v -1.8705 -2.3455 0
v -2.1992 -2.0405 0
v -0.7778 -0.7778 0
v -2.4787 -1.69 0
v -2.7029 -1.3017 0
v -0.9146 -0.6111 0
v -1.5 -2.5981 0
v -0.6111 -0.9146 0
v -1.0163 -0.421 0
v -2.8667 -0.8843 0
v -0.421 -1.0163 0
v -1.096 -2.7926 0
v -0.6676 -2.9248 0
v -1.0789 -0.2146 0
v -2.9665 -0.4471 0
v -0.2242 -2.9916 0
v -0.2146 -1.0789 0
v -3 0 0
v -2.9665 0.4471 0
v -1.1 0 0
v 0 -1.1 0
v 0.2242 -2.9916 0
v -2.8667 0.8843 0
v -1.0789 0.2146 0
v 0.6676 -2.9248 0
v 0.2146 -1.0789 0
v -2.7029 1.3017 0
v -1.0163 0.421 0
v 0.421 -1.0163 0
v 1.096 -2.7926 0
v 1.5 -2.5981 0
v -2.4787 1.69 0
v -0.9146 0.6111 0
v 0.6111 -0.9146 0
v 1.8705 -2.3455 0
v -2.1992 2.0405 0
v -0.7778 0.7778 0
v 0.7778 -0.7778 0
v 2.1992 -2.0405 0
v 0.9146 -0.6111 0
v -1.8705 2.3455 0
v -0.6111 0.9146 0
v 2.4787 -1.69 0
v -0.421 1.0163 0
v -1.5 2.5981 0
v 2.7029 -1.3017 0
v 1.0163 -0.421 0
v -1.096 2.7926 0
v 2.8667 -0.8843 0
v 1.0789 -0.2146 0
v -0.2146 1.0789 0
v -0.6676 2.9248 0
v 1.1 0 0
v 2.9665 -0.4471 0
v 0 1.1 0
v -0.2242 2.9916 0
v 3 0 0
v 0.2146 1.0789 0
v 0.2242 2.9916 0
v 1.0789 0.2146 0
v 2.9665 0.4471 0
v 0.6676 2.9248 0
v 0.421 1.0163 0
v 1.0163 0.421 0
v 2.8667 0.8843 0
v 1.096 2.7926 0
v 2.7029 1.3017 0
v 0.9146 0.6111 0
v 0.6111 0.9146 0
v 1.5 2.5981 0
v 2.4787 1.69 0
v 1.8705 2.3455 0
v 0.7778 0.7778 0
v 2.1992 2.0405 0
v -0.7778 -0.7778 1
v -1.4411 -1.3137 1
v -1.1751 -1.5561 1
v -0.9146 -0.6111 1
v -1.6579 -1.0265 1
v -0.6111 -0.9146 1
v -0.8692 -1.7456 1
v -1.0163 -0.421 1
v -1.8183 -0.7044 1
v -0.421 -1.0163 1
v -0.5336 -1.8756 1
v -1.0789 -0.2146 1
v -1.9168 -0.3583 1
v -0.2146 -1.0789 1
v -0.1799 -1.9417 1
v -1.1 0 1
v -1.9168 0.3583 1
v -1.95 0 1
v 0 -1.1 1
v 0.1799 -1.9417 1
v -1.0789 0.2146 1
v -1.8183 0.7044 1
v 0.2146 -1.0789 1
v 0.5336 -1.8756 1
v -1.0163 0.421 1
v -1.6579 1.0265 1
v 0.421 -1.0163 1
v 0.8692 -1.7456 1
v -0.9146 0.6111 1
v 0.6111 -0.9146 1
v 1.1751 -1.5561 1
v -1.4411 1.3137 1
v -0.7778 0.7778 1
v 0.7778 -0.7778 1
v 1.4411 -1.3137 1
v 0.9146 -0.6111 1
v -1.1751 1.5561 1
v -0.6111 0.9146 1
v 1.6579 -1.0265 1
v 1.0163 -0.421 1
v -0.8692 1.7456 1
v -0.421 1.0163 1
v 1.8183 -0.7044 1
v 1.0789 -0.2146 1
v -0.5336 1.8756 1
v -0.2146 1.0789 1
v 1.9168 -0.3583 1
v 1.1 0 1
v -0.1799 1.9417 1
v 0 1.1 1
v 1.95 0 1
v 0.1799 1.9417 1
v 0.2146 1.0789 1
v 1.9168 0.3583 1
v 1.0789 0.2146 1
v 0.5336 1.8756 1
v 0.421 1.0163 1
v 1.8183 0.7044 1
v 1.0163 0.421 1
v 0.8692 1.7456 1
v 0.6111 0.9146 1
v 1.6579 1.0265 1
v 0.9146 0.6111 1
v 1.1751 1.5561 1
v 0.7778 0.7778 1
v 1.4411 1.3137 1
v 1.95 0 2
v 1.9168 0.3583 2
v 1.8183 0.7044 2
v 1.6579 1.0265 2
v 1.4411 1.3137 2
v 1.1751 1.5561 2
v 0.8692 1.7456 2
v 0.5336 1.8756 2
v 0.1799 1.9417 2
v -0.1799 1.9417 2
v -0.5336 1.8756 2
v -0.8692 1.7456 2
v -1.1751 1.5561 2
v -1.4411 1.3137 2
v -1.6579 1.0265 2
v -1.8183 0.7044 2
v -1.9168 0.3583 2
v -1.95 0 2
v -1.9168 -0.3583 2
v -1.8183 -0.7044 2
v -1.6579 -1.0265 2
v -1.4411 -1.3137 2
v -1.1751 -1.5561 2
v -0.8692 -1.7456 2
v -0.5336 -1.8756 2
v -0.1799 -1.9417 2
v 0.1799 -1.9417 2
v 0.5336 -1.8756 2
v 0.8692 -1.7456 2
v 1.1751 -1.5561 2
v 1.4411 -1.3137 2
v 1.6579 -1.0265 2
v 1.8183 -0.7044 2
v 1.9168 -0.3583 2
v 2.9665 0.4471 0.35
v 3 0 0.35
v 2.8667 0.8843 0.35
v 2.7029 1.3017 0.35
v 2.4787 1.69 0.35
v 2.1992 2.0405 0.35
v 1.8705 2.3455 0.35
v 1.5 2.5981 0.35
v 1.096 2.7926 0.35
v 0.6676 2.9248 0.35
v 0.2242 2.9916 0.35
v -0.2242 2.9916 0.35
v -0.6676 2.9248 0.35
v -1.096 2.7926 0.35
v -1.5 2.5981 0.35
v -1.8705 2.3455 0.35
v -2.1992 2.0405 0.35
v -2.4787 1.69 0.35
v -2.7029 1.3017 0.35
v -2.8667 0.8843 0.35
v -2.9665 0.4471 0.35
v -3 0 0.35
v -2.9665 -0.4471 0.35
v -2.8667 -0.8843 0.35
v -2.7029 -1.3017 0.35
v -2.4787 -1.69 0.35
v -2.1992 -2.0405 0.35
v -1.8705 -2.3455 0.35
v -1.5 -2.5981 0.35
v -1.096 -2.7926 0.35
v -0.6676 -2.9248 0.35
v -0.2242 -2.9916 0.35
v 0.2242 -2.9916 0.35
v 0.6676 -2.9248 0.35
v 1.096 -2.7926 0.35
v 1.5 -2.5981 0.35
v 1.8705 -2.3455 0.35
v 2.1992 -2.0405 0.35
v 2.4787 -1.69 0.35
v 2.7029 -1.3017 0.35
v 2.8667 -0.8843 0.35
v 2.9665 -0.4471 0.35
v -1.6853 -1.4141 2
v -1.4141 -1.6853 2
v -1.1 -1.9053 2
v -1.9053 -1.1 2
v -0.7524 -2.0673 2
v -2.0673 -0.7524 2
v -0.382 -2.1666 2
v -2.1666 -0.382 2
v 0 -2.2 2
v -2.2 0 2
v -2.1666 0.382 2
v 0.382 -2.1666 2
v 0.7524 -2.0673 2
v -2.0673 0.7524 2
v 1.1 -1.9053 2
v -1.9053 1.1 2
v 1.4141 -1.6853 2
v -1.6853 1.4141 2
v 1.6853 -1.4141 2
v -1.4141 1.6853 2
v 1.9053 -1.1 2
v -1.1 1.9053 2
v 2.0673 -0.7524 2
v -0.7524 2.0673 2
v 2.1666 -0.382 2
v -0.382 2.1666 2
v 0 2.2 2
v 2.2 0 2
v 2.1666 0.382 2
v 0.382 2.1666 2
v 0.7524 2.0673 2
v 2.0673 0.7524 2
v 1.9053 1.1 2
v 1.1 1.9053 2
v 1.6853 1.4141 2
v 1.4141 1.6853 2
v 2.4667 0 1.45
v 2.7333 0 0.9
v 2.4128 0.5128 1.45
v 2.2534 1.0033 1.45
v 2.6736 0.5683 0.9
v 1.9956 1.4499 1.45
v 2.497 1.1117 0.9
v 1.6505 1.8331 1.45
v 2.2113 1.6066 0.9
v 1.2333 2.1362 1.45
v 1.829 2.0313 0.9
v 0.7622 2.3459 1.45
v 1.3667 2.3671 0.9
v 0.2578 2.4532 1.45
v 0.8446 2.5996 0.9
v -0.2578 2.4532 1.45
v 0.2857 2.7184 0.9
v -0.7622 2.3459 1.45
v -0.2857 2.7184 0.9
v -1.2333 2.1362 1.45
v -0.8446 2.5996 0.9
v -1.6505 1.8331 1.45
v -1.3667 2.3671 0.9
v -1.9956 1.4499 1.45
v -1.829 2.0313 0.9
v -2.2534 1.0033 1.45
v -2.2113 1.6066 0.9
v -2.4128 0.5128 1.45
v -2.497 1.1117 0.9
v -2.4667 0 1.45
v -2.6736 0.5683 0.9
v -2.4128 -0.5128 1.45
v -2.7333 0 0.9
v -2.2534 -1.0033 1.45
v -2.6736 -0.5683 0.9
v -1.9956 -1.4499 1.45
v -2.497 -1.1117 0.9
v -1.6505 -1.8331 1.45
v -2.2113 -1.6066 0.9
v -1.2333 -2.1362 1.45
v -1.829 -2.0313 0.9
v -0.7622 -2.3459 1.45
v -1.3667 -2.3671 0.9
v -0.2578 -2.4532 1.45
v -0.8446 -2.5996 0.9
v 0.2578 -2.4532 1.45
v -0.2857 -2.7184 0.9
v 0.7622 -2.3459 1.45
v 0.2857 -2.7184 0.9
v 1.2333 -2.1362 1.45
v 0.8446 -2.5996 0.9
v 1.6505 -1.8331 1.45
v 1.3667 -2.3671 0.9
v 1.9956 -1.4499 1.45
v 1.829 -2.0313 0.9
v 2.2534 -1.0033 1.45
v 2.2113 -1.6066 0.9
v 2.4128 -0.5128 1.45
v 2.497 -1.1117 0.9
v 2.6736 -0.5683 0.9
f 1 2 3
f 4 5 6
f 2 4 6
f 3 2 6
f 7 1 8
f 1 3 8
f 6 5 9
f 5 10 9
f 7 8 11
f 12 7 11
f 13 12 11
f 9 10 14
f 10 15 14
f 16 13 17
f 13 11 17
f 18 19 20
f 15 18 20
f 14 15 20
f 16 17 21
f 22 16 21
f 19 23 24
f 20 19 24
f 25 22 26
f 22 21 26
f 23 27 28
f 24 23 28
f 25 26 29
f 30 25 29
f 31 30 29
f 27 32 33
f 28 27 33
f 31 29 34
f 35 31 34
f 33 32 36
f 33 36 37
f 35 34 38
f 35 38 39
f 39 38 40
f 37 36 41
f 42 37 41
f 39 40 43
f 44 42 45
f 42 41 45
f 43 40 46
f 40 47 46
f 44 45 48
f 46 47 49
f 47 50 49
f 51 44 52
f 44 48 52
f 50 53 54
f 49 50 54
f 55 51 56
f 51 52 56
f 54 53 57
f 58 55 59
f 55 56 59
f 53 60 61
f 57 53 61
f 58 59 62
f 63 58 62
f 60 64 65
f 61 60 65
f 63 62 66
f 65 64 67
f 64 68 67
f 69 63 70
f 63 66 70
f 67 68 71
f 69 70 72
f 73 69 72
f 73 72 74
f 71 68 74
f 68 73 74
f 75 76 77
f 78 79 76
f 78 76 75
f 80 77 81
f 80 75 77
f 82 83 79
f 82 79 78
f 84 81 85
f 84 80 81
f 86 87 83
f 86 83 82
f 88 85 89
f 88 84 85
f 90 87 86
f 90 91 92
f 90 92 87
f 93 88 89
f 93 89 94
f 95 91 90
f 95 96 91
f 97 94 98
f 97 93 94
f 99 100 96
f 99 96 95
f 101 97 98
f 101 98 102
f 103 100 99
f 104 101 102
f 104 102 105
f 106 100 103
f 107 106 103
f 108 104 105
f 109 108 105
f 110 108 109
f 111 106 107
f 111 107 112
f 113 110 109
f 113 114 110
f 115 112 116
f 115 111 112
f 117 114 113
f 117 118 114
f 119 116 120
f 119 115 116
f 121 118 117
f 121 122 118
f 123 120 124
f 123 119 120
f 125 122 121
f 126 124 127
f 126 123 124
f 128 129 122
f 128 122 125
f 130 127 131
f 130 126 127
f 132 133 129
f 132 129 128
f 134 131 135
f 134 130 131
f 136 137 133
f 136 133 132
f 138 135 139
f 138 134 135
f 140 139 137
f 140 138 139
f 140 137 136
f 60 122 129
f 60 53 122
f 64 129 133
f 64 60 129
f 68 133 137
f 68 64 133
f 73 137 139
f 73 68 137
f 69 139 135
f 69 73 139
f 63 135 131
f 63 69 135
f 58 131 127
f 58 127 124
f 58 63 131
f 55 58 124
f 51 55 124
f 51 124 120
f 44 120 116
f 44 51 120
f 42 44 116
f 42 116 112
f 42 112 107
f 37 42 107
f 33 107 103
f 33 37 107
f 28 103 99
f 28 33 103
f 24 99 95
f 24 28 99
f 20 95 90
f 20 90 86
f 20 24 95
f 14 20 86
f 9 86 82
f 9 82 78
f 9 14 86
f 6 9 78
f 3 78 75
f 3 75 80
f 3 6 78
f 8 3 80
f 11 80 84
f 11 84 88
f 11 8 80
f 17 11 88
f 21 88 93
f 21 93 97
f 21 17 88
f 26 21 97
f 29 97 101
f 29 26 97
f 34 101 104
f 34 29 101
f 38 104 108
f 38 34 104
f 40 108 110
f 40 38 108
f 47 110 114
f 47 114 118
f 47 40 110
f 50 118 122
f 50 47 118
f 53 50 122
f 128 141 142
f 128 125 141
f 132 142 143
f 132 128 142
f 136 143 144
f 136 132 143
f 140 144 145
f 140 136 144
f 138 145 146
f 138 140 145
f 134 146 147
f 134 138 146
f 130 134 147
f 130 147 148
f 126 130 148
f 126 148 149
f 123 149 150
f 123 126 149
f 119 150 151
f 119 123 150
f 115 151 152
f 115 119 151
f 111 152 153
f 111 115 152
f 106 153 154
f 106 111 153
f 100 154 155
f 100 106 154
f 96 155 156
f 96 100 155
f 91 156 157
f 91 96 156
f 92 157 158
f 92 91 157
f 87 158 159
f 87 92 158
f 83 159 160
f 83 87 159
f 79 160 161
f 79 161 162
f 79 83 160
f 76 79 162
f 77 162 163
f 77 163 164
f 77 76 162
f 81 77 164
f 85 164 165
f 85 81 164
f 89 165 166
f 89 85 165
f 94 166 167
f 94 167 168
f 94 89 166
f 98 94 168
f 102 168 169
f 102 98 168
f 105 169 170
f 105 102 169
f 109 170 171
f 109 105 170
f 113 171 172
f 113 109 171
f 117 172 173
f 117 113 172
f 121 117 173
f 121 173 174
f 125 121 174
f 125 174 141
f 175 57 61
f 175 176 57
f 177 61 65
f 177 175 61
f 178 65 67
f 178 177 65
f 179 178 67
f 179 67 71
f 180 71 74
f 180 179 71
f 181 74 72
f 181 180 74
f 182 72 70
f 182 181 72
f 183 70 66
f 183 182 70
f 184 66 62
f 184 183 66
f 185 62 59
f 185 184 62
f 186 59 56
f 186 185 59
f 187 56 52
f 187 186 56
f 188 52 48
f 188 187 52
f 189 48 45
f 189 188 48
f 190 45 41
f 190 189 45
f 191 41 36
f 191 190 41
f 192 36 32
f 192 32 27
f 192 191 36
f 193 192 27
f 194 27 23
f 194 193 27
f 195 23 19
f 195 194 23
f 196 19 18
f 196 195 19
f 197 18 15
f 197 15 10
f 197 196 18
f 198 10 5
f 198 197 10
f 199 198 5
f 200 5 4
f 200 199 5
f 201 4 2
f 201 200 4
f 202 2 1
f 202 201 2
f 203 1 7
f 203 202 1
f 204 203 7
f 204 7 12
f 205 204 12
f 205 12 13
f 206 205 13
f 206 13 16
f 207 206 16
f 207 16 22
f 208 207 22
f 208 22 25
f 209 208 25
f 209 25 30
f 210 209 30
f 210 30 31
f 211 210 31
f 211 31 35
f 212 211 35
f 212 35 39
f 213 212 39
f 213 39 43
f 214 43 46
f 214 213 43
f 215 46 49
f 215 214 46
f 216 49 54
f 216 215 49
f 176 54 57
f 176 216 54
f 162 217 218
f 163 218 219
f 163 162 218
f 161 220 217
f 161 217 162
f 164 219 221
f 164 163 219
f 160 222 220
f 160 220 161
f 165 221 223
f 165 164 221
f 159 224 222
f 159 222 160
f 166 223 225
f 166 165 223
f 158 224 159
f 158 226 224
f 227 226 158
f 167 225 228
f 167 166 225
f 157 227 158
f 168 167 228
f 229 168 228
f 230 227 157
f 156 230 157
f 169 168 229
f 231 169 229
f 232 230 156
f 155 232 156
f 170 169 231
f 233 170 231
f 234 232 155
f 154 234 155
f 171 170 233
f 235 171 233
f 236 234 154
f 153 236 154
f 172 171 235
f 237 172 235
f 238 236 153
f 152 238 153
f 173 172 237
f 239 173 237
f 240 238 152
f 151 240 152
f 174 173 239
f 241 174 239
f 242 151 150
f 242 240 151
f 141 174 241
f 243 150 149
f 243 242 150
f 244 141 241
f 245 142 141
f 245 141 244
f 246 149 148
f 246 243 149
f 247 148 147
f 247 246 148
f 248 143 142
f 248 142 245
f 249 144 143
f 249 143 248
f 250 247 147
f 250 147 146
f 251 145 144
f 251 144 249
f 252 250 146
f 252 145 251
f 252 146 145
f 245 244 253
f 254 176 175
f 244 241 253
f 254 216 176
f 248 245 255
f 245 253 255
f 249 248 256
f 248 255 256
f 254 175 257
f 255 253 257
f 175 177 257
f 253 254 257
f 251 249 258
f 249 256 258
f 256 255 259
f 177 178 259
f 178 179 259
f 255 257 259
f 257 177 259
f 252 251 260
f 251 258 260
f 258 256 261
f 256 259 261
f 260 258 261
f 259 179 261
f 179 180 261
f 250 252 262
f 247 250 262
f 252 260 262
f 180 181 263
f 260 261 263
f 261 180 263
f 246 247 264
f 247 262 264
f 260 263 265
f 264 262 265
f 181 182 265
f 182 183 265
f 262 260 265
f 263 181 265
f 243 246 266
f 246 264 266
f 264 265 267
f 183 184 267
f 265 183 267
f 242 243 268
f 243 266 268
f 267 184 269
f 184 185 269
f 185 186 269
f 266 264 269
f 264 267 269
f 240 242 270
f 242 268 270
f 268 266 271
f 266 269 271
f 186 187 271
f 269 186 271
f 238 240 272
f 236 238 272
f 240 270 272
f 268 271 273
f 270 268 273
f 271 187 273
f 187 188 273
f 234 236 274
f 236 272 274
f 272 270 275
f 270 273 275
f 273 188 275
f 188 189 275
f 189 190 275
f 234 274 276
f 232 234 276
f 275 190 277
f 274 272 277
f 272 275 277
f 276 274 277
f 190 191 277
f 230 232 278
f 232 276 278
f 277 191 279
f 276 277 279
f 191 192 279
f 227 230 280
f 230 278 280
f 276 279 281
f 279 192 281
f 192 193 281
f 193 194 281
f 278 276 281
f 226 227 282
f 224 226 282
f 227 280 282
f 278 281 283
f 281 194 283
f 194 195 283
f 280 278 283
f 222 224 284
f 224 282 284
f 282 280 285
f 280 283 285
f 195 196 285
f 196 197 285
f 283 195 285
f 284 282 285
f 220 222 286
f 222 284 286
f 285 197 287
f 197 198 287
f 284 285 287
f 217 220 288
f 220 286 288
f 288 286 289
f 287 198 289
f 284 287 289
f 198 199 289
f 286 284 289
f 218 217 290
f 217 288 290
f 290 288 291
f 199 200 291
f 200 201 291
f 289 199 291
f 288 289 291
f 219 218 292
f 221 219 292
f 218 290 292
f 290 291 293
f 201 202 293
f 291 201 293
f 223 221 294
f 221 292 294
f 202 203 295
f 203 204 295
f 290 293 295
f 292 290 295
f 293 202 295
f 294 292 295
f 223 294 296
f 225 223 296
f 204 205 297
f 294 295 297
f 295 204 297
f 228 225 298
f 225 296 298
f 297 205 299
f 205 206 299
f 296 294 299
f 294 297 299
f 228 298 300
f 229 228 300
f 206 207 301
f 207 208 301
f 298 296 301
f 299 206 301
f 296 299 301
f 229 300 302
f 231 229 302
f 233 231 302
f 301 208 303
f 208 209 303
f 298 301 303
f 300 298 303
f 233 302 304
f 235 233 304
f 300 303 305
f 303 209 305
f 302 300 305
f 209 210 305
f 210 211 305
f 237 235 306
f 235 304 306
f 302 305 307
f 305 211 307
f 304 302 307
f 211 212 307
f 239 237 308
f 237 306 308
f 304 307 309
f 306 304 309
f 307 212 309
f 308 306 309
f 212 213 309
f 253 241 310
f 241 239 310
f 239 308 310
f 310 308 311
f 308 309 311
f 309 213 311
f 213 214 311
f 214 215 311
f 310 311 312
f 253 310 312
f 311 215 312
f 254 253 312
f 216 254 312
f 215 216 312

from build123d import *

# Parameters (mm, degrees)
F7_R  = 3
F8_R  = 3
F10_R = 2.2
F9_R  = 1.95
F11_R = 1.95
F13_R = 1.1
F12_R = 1.1


with BuildPart() as f14:
    # F7 (on Top) → F14 section 0
    with BuildSketch(Plane.XY):
        Circle(F7_R)
    # F8 (on offset) → F14 section 1
    with BuildSketch(Plane.XY.offset(0.35)):
        Circle(F8_R)
    loft()

    # F10 (on offset) → F15 section 0
    with BuildSketch(Plane.XY.offset(2)):
        Circle(F10_R)
    # F8 (on offset) → F15 section 1
    with BuildSketch(Plane.XY.offset(0.35)):
        Circle(F8_R)
    loft()

    # F9 (on offset) → F16 section 0
    with BuildSketch(Plane.XY.offset(2)):
        Circle(F9_R)
    # F11 (on offset) → F16 section 1
    with BuildSketch(Plane.XY.offset(1)):
        Circle(F11_R)
    loft(mode=Mode.SUBTRACT)

    # F13 (on offset) → F17 section 0
    with BuildSketch(Plane.XY.offset(1)):
        Circle(F13_R)
    # F12 (on Top) → F17 section 1
    with BuildSketch(Plane.XY):
        Circle(F12_R)
    loft(mode=Mode.SUBTRACT)


solid = f14.part
